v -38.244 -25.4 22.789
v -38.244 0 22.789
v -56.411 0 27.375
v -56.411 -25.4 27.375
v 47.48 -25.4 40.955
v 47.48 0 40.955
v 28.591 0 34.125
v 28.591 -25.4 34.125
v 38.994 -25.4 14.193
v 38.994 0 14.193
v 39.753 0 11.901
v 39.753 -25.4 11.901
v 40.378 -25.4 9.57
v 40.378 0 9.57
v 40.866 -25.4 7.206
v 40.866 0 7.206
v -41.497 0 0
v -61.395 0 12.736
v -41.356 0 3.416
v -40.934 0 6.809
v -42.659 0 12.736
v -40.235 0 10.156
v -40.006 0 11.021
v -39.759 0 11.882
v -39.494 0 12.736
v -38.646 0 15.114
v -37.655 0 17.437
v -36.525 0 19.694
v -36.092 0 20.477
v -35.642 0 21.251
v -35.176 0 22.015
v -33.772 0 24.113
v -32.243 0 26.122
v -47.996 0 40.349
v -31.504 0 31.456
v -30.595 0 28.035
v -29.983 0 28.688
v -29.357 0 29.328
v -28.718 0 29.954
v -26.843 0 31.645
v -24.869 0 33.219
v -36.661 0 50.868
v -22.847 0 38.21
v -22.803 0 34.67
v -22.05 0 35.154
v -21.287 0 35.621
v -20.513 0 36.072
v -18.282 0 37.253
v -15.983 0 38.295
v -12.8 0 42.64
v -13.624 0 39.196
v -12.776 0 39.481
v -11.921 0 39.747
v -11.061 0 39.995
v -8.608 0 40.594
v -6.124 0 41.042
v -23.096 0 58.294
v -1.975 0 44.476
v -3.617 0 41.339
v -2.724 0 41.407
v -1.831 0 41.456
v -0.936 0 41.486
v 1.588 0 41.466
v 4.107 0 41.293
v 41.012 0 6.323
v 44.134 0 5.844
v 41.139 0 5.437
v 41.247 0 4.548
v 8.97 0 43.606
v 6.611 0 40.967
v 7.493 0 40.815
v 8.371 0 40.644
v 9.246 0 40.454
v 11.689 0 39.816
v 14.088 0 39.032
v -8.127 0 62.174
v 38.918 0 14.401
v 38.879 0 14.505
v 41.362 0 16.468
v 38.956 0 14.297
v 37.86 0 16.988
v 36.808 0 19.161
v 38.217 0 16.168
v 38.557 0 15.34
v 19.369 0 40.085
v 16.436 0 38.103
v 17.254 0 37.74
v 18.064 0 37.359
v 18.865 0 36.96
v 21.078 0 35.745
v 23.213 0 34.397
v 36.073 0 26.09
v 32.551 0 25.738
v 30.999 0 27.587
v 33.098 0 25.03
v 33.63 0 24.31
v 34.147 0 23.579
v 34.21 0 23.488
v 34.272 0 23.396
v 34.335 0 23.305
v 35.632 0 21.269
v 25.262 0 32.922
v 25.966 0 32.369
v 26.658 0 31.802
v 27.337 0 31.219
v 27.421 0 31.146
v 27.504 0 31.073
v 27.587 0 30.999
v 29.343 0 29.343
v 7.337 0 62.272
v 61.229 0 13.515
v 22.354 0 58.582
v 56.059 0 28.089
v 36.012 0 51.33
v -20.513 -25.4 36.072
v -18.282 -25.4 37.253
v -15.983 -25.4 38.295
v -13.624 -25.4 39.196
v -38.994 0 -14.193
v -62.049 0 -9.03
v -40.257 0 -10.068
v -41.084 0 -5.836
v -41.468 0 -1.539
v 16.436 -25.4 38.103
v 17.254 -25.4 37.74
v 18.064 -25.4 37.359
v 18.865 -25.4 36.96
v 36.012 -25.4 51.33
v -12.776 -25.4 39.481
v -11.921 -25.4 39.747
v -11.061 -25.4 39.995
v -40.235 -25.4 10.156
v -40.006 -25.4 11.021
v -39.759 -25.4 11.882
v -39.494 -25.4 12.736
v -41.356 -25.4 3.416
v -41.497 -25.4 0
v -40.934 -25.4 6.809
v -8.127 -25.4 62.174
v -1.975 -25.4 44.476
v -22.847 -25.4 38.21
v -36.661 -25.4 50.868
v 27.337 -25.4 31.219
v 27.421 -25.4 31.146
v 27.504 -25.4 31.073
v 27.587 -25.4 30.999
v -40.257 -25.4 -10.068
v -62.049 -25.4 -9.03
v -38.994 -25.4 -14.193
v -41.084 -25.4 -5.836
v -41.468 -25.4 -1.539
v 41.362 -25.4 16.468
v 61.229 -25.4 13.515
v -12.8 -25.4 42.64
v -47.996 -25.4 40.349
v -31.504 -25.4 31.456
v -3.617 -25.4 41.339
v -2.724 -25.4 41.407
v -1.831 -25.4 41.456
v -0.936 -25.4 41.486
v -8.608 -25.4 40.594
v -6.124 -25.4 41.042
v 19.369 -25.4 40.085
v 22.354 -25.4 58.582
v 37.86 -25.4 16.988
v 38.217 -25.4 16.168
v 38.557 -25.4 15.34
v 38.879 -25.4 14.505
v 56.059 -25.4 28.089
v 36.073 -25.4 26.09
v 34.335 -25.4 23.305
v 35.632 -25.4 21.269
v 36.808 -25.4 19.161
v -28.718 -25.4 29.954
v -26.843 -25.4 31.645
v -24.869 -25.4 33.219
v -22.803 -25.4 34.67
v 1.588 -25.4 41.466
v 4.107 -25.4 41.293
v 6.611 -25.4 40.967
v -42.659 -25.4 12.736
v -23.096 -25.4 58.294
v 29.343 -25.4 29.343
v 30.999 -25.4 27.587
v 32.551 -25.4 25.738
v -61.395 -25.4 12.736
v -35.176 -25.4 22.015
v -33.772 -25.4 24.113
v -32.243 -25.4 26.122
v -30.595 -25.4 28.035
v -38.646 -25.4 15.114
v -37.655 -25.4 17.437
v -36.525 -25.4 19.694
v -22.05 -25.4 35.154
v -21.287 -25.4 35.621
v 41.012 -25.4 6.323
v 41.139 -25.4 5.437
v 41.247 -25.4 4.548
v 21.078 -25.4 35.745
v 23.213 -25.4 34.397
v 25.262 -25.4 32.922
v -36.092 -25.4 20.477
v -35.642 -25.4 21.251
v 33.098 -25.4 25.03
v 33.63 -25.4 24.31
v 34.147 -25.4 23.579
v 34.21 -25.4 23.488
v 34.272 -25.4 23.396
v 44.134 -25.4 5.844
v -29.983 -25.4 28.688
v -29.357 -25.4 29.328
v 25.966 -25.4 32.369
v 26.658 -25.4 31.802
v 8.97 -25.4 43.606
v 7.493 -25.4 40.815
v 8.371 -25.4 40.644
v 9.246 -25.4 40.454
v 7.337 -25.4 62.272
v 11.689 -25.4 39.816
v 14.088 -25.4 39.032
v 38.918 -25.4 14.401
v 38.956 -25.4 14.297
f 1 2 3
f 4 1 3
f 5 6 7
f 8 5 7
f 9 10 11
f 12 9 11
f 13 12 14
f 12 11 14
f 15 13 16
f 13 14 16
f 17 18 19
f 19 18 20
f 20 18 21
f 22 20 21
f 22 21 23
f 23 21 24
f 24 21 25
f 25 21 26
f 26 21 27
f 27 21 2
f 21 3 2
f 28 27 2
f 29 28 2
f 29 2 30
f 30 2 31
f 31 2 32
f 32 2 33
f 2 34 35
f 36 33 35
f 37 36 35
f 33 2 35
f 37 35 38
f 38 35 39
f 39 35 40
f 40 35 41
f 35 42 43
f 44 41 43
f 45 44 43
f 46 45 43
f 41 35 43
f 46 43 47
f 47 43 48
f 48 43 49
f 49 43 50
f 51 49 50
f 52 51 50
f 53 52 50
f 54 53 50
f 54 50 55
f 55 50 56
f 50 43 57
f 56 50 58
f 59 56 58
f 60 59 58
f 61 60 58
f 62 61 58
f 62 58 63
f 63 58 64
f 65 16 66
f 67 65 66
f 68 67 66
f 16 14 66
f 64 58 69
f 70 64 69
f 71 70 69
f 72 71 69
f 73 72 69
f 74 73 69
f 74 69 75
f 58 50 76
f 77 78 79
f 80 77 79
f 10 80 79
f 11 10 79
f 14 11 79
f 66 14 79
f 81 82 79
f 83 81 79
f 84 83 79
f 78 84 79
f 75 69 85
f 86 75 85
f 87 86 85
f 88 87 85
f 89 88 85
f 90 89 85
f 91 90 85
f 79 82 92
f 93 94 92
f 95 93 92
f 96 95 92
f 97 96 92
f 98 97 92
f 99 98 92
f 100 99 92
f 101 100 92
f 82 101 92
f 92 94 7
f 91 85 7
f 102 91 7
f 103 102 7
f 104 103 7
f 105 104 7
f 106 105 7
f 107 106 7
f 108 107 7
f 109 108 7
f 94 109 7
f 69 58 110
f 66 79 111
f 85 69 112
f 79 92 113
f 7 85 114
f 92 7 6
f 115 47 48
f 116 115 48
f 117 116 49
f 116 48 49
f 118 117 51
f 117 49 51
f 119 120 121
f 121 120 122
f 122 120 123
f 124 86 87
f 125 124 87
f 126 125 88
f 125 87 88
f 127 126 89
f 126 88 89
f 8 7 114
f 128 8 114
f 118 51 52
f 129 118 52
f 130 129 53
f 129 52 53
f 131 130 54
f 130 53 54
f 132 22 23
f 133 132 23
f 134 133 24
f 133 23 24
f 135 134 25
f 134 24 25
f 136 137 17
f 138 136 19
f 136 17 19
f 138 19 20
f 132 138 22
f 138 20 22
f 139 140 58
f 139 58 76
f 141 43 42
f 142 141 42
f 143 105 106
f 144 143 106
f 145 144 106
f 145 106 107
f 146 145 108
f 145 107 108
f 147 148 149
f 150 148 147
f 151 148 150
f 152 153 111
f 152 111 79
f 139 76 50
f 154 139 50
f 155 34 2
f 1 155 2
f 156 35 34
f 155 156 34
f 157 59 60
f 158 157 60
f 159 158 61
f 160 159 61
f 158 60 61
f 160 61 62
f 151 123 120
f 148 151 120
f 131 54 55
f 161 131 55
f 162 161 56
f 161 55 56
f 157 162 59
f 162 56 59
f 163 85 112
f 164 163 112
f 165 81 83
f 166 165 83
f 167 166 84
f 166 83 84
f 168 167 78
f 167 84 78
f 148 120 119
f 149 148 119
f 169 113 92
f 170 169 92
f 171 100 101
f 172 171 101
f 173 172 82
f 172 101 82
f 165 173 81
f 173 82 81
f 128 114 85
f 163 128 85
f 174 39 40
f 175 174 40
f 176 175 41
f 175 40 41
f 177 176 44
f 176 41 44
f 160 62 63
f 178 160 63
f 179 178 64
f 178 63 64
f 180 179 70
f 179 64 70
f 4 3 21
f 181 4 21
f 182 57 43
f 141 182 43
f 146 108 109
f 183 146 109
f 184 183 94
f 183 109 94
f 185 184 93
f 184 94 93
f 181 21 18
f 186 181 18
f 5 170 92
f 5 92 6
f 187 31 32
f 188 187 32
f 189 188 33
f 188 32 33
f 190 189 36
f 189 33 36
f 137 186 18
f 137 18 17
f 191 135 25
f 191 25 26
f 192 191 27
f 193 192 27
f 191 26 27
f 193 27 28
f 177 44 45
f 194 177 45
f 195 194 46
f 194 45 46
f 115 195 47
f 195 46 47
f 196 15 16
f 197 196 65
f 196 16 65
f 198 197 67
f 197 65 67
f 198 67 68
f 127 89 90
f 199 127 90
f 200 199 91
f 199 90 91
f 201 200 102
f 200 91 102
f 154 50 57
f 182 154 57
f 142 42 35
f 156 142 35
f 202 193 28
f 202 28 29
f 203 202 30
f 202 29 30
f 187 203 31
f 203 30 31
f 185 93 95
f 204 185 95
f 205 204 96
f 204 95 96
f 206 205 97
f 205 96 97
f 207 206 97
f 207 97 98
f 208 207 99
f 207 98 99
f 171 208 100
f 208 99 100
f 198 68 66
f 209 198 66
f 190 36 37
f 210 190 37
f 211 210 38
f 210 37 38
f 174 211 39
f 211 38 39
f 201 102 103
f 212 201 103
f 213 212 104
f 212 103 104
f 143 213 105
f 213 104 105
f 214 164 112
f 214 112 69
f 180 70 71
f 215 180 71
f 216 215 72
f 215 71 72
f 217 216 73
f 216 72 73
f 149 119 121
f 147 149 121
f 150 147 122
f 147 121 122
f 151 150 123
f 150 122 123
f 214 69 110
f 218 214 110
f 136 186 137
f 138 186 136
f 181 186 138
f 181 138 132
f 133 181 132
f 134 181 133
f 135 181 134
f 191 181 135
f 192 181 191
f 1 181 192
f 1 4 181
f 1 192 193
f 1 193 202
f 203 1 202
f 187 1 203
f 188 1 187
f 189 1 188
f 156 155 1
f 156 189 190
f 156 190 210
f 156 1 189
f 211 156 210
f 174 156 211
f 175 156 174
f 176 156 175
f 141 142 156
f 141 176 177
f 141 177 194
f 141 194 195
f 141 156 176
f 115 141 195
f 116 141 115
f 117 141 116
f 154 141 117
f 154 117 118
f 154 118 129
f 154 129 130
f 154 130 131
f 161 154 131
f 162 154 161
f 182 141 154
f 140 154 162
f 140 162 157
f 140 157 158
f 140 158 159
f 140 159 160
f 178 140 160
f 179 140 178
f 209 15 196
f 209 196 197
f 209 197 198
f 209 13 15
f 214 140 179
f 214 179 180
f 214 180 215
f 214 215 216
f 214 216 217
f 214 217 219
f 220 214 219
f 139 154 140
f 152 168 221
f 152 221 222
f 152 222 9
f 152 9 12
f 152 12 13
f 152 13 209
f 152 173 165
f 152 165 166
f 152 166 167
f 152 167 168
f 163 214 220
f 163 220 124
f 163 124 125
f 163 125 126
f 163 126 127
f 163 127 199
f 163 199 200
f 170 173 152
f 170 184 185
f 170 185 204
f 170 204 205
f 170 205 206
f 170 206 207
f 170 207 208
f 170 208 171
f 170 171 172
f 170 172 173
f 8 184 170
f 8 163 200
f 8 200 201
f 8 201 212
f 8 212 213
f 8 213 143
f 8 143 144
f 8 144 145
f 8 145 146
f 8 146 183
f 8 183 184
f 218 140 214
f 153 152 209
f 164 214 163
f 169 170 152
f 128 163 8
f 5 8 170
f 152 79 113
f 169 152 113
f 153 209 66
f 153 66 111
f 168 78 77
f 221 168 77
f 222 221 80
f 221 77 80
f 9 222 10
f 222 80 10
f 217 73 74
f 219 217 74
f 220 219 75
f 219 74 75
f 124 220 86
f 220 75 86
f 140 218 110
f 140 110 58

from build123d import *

# Parameters (mm, degrees)
F1_DEPTH = 25.4


with BuildPart() as f1:
    # F0 (on Front) → F1 (new body)
    with BuildSketch(Plane.XZ):
        with BuildLine():
            ThreePointArc((-38.99411, -14.192695), (-40.725516, -7.962757), (-41.468098, -1.539482))
            Line((-41.468098, -1.539482), (-62.048898, -9.03028))
            Line((-62.048898, -9.03028), (-38.99411, -14.192695))
        make_face()
        with BuildLine():
            ThreePointArc((40.866237, 7.20582), (41.077933, 5.880187), (41.246639, 4.548401))
            Line((41.246639, 4.548401), (44.134154, 5.844083))
            Line((44.134154, 5.844083), (40.866237, 7.20582))
        make_face()
        with BuildLine():
            ThreePointArc((38.99411, 14.192695), (40.0827, 10.740127), (40.866237, 7.20582))
            Line((40.866237, 7.20582), (44.134154, 5.844083))
            Line((44.134154, 5.844083), (61.228775, 13.51476))
            Line((61.228775, 13.51476), (41.361641, 16.467892))
            Line((41.361641, 16.467892), (38.879051, 14.504915))
            ThreePointArc((38.879051, 14.504915), (38.936893, 14.34892), (38.99411, 14.192695))
        make_face()
        with BuildLine():
            ThreePointArc((37.859832, 16.988416), (38.38953, 15.754909), (38.879051, 14.504915))
            Line((38.879051, 14.504915), (41.361641, 16.467892))
            Line((41.361641, 16.467892), (37.859832, 16.988416))
        make_face()
        with BuildLine():
            Line((37.859832, 16.988416), (41.361641, 16.467892))
            Line((41.361641, 16.467892), (56.059032, 28.089083))
            Line((56.059032, 28.089083), (36.07334, 26.090055))
            Line((36.07334, 26.090055), (34.146676, 23.579179))
            ThreePointArc((34.146676, 23.579179), (34.240938, 23.442085), (34.334649, 23.304614))
            ThreePointArc((34.334649, 23.304614), (36.235126, 20.223471), (37.859832, 16.988416))
        make_face()
        with BuildLine():
            Line((32.550634, 25.737704), (36.07334, 26.090055))
            Line((36.07334, 26.090055), (47.479543, 40.95491))
            Line((47.479543, 40.95491), (28.590906, 34.125312))
            Line((28.590906, 34.125312), (27.337357, 31.219258))
            ThreePointArc((27.337357, 31.219258), (27.462305, 31.109404), (27.586811, 30.999049))
            ThreePointArc((27.586811, 30.999049), (30.18358, 28.476739), (32.550634, 25.737704))
        make_face()
        with BuildLine():
            Line((34.146676, 23.579179), (36.07334, 26.090055))
            Line((36.07334, 26.090055), (32.550634, 25.737704))
            ThreePointArc((32.550634, 25.737704), (33.366115, 24.671351), (34.146676, 23.579179))
        make_face()
        with BuildLine():
            Line((25.261569, 32.921517), (28.590906, 34.125312))
            Line((28.590906, 34.125312), (36.012149, 51.329687))
            Line((36.012149, 51.329687), (19.369454, 40.084923))
            Line((19.369454, 40.084923), (18.865265, 36.960451))
            ThreePointArc((18.865265, 36.960451), (22.155645, 35.087043), (25.261569, 32.921517))
        make_face()
        with BuildLine():
            Line((27.337357, 31.219258), (28.590906, 34.125312))
            Line((28.590906, 34.125312), (25.261569, 32.921517))
            ThreePointArc((25.261569, 32.921517), (26.313232, 32.087178), (27.337357, 31.219258))
        make_face()
        with BuildLine():
            Line((16.435989, 38.102906), (19.369454, 40.084923))
            Line((19.369454, 40.084923), (22.354345, 58.582377))
            Line((22.354345, 58.582377), (8.96987, 43.606402))
            Line((8.96987, 43.606402), (9.245708, 40.453554))
            ThreePointArc((9.245708, 40.453554), (12.894525, 39.442419), (16.435989, 38.102906))
        make_face()
        with BuildLine():
            Line((18.865265, 36.960451), (19.369454, 40.084923))
            Line((19.369454, 40.084923), (16.435989, 38.102906))
            ThreePointArc((16.435989, 38.102906), (17.659868, 37.551328), (18.865265, 36.960451))
        make_face()
        with BuildLine():
            Line((6.610704, 40.966715), (8.96987, 43.606402))
            Line((8.96987, 43.606402), (7.336855, 62.271841))
            Line((7.336855, 62.271841), (-1.975299, 44.475555))
            Line((-1.975299, 44.475555), (-0.936211, 41.486102))
            ThreePointArc((-0.936211, 41.486102), (2.849106, 41.398741), (6.610704, 40.966715))
        make_face()
        with BuildLine():
            Line((9.245708, 40.453554), (8.96987, 43.606402))
            Line((8.96987, 43.606402), (6.610704, 40.966715))
            ThreePointArc((6.610704, 40.966715), (7.932357, 40.731448), (9.245708, 40.453554))
        make_face()
        with BuildLine():
            Line((-3.616673, 41.338757), (-1.975299, 44.475555))
            Line((-1.975299, 44.475555), (-8.126892, 62.17367))
            Line((-8.126892, 62.17367), (-12.800322, 42.639519))
            Line((-12.800322, 42.639519), (-11.061187, 39.995291))
            ThreePointArc((-11.061187, 39.995291), (-7.369607, 40.837018), (-3.616673, 41.338757))
        make_face()
        with BuildLine():
            Line((-0.936211, 41.486102), (-1.975299, 44.475555))
            Line((-1.975299, 44.475555), (-3.616673, 41.338757))
            ThreePointArc((-3.616673, 41.338757), (-2.277634, 41.434111), (-0.936211, 41.486102))
        make_face()
        with BuildLine():
            Line((-13.624068, 39.196402), (-12.800322, 42.639519))
            Line((-12.800322, 42.639519), (-23.096329, 58.293836))
            Line((-23.096329, 58.293836), (-22.846776, 38.209968))
            Line((-22.846776, 38.209968), (-20.513374, 36.071799))
            ThreePointArc((-20.513374, 36.071799), (-17.140071, 37.791416), (-13.624068, 39.196402))
        make_face()
        with BuildLine():
            Line((-11.061187, 39.995291), (-12.800322, 42.639519))
            Line((-12.800322, 42.639519), (-13.624068, 39.196402))
            ThreePointArc((-13.624068, 39.196402), (-12.349089, 39.616577), (-11.061187, 39.995291))
        make_face()
        with BuildLine():
            Line((-22.80279, 34.669957), (-22.846776, 38.209968))
            Line((-22.846776, 38.209968), (-36.660949, 50.868325))
            Line((-36.660949, 50.868325), (-31.503593, 31.456326))
            Line((-31.503593, 31.456326), (-28.717852, 29.954268))
            ThreePointArc((-28.717852, 29.954268), (-25.868003, 32.447182), (-22.80279, 34.669957))
        make_face()
        with BuildLine():
            Line((-20.513374, 36.071799), (-22.846776, 38.209968))
            Line((-22.846776, 38.209968), (-22.80279, 34.669957))
            ThreePointArc((-22.80279, 34.669957), (-21.669421, 35.389396), (-20.513374, 36.071799))
        make_face()
        with BuildLine():
            Line((-30.59455, 28.03474), (-31.503593, 31.456326))
            Line((-31.503593, 31.456326), (-47.995696, 40.348789))
            Line((-47.995696, 40.348789), (-38.244229, 22.789378))
            Line((-38.244229, 22.789378), (-35.175589, 22.014793))
            ThreePointArc((-35.175589, 22.014793), (-33.022534, 25.129373), (-30.59455, 28.03474))
        make_face()
        with BuildLine():
            Line((-28.717852, 29.954268), (-31.503593, 31.456326))
            Line((-31.503593, 31.456326), (-30.59455, 28.03474))
            ThreePointArc((-30.59455, 28.03474), (-29.671727, 29.009684), (-28.717852, 29.954268))
        make_face()
        with BuildLine():
            Line((-36.525422, 19.694332), (-38.244229, 22.789378))
            Line((-38.244229, 22.789378), (-56.411144, 27.375071))
            Line((-56.411144, 27.375071), (-42.65869, 12.736285))
            Line((-42.65869, 12.736285), (-39.4938, 12.736285))
            ThreePointArc((-39.4938, 12.736285), (-38.168496, 16.283091), (-36.525422, 19.694332))
        make_face()
        with BuildLine():
            Line((-35.175589, 22.014793), (-38.244229, 22.789378))
            Line((-38.244229, 22.789378), (-36.525422, 19.694332))
            ThreePointArc((-36.525422, 19.694332), (-35.869275, 20.865481), (-35.175589, 22.014793))
        make_face()
        with BuildLine():
            Line((-40.234664, 10.156032), (-42.65869, 12.736285))
            Line((-42.65869, 12.736285), (-61.395429, 12.736285))
            Line((-61.395429, 12.736285), (-41.496665, 0))
            ThreePointArc((-41.496665, 0), (-41.179956, 5.11707), (-40.234664, 10.156032))
        make_face()
        with BuildLine():
            Line((-39.4938, 12.736285), (-42.65869, 12.736285))
            Line((-42.65869, 12.736285), (-40.234664, 10.156032))
            ThreePointArc((-40.234664, 10.156032), (-39.885103, 11.452151), (-39.4938, 12.736285))
        make_face()
    extrude(amount=F1_DEPTH)


solid = f1.part
